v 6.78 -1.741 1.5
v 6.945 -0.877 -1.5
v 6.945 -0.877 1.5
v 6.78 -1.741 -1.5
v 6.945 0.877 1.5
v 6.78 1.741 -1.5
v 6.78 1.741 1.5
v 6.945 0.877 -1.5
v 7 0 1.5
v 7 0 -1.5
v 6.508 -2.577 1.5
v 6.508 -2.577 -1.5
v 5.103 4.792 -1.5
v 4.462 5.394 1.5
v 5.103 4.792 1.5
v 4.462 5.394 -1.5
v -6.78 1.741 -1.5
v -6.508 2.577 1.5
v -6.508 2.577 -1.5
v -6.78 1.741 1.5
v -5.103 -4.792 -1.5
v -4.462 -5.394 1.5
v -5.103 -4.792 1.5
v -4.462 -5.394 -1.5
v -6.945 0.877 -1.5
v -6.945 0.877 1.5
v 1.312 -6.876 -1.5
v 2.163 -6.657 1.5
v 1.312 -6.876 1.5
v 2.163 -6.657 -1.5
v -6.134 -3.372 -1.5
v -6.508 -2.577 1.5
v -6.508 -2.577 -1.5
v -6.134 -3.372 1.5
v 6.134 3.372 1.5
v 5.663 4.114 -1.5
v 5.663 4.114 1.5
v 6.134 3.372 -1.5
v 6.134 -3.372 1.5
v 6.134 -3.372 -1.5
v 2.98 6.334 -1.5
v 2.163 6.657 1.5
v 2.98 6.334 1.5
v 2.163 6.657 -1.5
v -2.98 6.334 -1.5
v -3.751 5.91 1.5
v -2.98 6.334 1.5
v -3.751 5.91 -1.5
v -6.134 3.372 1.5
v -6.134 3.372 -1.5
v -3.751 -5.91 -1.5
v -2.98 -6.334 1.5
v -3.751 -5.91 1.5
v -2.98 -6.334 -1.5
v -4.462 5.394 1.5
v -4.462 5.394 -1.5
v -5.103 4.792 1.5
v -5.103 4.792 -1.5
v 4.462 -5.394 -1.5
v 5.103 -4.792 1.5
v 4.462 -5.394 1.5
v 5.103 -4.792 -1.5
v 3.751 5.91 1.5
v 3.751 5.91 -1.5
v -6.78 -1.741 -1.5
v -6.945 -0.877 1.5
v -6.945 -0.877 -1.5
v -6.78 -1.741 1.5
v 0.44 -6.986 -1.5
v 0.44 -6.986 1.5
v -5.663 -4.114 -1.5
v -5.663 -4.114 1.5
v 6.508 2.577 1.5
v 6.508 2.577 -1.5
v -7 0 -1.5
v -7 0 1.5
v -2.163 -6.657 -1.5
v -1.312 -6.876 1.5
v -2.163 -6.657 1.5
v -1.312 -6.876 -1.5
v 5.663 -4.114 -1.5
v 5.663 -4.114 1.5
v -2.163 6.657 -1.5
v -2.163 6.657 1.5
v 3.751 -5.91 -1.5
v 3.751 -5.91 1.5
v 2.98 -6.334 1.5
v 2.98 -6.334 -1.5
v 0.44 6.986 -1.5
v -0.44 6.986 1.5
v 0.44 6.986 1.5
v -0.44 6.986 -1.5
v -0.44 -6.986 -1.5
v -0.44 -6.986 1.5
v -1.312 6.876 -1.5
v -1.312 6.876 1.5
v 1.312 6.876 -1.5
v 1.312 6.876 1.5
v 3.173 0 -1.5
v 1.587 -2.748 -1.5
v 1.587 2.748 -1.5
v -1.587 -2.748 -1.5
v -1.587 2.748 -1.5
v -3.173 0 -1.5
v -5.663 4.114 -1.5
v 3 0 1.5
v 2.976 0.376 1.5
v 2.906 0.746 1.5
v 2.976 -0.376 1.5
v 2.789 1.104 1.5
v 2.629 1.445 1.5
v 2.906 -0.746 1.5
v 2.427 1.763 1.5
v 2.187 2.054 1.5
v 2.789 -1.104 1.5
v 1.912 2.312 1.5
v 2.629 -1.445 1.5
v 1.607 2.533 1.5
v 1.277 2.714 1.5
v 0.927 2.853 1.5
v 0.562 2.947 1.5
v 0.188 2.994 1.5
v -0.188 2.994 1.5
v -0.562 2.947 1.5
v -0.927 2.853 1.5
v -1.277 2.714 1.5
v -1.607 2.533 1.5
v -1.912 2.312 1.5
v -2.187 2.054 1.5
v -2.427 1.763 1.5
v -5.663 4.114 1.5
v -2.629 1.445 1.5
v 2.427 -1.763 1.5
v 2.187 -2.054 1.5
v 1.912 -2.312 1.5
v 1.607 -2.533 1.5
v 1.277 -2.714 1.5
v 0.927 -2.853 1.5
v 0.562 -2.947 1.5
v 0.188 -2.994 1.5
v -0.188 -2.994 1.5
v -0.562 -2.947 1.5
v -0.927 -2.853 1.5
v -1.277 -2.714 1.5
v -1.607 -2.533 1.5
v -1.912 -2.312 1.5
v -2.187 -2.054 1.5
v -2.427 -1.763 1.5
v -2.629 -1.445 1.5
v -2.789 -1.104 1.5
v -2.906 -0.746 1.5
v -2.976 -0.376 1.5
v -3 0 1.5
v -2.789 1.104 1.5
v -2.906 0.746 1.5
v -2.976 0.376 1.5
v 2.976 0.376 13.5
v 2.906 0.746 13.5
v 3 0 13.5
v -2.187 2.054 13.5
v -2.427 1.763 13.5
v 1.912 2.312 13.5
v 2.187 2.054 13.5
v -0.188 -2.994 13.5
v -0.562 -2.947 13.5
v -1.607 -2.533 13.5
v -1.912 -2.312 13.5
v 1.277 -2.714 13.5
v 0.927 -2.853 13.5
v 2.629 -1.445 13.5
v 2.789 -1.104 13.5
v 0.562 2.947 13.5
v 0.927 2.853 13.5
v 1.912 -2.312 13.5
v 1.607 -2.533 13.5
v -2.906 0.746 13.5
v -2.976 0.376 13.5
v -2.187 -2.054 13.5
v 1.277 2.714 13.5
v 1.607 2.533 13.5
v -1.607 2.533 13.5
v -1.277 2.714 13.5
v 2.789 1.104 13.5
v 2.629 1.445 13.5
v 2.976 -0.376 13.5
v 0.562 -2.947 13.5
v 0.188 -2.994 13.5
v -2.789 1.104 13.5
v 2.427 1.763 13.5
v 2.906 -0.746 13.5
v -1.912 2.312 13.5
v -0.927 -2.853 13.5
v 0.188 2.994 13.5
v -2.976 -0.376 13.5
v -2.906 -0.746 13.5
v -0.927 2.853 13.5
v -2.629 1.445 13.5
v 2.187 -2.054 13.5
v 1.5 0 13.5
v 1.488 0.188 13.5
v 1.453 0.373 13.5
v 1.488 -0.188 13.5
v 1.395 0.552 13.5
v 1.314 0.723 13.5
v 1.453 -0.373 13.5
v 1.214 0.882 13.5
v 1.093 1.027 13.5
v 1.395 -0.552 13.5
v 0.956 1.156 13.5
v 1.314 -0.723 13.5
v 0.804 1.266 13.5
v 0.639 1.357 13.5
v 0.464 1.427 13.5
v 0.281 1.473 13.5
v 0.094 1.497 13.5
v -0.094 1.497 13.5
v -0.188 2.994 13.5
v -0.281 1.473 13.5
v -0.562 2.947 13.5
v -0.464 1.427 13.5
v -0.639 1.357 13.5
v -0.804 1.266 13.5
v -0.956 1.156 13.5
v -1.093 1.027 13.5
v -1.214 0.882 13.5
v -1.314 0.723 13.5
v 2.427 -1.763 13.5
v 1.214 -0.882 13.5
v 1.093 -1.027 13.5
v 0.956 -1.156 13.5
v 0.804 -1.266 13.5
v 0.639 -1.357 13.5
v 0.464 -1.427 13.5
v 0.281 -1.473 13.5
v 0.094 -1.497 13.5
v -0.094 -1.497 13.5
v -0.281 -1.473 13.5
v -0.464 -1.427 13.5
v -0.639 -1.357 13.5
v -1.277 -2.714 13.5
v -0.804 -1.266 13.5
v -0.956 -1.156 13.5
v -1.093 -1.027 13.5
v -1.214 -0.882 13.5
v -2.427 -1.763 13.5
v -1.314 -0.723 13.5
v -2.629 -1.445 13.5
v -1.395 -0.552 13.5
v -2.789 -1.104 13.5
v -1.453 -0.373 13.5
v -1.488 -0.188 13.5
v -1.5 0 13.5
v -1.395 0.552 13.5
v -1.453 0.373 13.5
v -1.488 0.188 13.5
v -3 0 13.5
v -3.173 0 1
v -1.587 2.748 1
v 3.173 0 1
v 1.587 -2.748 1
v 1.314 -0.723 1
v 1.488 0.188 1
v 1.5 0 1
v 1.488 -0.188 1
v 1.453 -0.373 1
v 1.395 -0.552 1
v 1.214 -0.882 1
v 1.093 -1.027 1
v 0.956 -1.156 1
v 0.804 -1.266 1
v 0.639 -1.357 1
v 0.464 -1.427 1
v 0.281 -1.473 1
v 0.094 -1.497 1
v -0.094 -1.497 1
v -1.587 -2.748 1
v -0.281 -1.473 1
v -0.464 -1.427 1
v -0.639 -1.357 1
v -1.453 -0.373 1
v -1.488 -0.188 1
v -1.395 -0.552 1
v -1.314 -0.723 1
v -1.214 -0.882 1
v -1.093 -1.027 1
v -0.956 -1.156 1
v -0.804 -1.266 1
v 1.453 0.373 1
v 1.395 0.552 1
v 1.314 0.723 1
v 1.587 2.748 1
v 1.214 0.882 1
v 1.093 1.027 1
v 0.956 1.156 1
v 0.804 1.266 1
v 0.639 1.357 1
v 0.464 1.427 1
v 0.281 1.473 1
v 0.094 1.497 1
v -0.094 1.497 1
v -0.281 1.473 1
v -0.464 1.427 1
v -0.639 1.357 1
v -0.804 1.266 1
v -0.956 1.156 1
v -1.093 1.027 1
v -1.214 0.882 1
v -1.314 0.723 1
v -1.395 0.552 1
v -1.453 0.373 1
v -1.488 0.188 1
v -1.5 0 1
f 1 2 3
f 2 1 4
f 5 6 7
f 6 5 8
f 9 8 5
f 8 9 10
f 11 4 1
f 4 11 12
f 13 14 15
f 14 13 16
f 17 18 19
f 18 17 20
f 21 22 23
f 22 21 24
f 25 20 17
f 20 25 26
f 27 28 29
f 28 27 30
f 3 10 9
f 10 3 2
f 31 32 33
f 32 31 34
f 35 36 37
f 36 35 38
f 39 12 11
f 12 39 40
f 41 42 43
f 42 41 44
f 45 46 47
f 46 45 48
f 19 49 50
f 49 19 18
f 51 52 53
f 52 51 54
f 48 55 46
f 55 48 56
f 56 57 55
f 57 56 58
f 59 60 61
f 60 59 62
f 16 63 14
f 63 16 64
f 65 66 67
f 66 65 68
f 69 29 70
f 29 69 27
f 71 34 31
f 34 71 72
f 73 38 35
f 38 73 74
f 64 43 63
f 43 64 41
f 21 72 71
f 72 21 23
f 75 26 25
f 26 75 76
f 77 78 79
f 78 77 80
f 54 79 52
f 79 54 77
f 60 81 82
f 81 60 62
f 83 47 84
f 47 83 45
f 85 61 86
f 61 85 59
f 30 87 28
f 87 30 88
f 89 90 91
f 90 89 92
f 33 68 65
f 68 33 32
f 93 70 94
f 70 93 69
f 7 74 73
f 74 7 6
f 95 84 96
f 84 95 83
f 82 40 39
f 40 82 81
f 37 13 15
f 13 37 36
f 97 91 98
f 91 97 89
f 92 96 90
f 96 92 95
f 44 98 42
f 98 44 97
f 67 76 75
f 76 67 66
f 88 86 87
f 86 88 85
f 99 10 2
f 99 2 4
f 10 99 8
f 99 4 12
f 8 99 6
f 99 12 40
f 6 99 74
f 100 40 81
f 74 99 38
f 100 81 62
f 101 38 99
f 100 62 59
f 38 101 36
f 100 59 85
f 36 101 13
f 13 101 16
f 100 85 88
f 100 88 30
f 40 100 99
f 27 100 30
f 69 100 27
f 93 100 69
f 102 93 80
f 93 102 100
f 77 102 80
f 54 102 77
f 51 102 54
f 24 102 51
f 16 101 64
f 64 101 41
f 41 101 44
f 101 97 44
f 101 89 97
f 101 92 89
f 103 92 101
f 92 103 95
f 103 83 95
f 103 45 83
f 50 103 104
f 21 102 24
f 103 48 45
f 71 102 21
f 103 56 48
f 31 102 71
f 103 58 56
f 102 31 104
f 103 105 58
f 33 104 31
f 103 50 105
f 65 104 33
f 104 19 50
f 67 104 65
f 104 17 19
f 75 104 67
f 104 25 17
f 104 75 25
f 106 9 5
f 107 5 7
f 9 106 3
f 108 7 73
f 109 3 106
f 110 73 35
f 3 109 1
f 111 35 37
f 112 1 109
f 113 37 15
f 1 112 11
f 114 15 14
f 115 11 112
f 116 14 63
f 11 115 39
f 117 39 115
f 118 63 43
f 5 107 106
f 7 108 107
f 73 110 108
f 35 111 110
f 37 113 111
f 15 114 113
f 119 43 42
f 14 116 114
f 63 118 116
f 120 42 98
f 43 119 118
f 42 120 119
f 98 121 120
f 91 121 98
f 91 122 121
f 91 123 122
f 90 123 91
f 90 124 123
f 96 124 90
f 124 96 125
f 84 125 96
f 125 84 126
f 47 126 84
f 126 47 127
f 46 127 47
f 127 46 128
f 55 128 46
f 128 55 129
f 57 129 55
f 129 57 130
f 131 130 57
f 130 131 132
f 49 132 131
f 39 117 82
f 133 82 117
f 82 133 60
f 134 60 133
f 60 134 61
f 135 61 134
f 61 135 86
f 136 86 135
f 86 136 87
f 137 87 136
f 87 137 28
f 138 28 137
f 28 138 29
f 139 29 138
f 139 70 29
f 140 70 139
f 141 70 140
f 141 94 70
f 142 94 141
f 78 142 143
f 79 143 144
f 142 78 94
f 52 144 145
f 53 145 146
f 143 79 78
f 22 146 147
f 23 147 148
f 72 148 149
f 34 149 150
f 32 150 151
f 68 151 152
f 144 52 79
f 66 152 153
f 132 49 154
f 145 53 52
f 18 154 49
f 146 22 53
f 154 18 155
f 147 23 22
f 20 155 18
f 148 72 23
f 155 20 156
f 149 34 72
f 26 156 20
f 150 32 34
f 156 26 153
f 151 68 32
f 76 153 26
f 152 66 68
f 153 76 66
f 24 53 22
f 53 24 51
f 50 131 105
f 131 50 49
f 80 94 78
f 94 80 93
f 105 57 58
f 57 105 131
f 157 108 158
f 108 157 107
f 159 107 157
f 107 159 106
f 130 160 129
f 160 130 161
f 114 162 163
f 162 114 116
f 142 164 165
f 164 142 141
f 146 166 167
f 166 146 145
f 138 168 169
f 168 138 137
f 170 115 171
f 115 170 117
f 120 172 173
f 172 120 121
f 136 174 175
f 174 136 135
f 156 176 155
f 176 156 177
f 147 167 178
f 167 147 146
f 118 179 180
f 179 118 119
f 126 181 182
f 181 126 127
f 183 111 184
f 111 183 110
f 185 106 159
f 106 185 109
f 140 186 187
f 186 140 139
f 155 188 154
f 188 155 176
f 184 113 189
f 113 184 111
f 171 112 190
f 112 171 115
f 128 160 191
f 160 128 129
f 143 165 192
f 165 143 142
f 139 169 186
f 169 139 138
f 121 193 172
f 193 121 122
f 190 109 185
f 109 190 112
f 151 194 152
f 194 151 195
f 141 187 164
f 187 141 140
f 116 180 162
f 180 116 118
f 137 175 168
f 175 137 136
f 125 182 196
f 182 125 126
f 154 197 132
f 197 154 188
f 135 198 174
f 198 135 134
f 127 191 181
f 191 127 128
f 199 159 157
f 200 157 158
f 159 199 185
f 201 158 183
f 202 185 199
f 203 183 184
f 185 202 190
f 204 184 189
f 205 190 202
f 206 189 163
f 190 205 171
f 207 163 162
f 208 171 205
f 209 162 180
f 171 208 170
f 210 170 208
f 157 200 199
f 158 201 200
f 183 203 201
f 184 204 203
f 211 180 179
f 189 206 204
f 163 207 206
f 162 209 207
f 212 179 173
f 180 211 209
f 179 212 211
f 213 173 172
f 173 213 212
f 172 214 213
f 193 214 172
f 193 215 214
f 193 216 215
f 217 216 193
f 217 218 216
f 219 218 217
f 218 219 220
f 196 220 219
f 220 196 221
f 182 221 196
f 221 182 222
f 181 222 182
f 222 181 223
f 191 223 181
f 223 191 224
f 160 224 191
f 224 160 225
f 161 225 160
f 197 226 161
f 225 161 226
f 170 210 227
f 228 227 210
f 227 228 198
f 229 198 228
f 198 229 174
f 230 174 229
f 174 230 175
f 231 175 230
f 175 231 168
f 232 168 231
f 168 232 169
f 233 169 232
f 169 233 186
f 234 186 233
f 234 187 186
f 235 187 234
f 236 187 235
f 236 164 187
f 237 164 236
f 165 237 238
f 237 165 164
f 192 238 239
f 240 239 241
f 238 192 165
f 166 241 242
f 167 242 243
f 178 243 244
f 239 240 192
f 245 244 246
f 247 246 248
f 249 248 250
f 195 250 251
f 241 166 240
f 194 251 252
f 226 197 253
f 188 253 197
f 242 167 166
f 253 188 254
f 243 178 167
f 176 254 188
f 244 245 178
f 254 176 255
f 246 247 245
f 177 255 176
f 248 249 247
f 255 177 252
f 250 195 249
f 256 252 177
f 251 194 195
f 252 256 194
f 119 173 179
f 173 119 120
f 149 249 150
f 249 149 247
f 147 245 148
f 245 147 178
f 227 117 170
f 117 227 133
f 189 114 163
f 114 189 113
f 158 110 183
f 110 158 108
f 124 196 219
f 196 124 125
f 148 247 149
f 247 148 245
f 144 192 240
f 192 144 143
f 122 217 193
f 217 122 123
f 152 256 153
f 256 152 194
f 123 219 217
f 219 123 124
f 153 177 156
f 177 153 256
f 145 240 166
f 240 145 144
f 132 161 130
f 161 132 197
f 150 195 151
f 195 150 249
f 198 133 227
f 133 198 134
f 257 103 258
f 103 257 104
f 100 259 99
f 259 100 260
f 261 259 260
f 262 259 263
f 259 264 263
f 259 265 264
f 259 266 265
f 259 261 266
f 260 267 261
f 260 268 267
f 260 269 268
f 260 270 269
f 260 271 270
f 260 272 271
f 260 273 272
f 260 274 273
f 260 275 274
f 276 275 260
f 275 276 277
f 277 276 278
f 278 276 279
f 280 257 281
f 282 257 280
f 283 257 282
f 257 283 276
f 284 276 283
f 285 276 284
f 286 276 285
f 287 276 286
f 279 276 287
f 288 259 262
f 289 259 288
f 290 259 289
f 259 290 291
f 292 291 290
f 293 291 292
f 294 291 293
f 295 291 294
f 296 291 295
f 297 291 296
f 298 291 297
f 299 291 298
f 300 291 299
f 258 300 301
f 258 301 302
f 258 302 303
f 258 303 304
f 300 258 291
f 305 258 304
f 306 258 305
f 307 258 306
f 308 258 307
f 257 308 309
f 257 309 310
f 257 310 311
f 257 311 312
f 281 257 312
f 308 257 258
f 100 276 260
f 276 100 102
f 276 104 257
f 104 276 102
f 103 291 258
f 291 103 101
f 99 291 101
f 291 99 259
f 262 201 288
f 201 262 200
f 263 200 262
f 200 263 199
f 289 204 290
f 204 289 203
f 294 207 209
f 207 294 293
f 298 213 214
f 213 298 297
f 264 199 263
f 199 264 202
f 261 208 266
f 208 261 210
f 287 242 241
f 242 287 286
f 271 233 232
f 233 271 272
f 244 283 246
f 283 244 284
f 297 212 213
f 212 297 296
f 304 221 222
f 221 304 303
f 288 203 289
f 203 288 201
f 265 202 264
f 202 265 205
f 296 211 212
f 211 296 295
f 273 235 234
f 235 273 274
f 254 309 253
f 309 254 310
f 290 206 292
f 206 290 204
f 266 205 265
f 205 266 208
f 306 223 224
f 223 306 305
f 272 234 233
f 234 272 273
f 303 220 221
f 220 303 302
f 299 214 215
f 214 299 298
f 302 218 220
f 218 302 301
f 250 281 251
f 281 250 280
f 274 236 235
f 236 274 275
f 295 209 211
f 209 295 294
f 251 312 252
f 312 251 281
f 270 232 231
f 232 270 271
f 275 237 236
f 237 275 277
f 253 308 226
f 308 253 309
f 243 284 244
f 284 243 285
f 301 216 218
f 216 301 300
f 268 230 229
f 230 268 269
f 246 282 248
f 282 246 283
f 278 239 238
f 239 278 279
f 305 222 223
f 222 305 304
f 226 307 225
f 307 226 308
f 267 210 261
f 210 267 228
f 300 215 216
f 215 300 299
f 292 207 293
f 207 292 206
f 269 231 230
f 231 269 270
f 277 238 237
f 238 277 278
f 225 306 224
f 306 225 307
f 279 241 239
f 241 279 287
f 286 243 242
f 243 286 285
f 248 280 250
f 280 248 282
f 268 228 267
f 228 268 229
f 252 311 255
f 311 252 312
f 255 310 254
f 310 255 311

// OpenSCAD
$fn = 50;


difference() {
	union() {
		translate(v = [0, 0, -1.5000000000]) {
			cylinder(h = 3, r = 7.0000000000);
		}
		translate(v = [0, 0, -1.5000000000]) {
			cylinder(h = 15, r = 3.0000000000);
		}
	}
	union() {
		translate(v = [0, 0, -1.5000000000]) {
			rotate(a = [0, 0, 0]) {
				difference() {
					union() {
						linear_extrude(height = 2.5000000000) {
							polygon(points = [[3.1735000000, 0.0000000000], [1.5867500000, 2.7483316189], [-1.5867500000, 2.7483316189], [-3.1735000000, 0.0000000000], [-1.5867500000, -2.7483316189], [1.5867500000, -2.7483316189]]);
						}
					}
					union();
				}
			}
		}
		translate(v = [0, 0, -100.0000000000]) {
			cylinder(h = 200, r = 1.5000000000);
		}
	}
}
